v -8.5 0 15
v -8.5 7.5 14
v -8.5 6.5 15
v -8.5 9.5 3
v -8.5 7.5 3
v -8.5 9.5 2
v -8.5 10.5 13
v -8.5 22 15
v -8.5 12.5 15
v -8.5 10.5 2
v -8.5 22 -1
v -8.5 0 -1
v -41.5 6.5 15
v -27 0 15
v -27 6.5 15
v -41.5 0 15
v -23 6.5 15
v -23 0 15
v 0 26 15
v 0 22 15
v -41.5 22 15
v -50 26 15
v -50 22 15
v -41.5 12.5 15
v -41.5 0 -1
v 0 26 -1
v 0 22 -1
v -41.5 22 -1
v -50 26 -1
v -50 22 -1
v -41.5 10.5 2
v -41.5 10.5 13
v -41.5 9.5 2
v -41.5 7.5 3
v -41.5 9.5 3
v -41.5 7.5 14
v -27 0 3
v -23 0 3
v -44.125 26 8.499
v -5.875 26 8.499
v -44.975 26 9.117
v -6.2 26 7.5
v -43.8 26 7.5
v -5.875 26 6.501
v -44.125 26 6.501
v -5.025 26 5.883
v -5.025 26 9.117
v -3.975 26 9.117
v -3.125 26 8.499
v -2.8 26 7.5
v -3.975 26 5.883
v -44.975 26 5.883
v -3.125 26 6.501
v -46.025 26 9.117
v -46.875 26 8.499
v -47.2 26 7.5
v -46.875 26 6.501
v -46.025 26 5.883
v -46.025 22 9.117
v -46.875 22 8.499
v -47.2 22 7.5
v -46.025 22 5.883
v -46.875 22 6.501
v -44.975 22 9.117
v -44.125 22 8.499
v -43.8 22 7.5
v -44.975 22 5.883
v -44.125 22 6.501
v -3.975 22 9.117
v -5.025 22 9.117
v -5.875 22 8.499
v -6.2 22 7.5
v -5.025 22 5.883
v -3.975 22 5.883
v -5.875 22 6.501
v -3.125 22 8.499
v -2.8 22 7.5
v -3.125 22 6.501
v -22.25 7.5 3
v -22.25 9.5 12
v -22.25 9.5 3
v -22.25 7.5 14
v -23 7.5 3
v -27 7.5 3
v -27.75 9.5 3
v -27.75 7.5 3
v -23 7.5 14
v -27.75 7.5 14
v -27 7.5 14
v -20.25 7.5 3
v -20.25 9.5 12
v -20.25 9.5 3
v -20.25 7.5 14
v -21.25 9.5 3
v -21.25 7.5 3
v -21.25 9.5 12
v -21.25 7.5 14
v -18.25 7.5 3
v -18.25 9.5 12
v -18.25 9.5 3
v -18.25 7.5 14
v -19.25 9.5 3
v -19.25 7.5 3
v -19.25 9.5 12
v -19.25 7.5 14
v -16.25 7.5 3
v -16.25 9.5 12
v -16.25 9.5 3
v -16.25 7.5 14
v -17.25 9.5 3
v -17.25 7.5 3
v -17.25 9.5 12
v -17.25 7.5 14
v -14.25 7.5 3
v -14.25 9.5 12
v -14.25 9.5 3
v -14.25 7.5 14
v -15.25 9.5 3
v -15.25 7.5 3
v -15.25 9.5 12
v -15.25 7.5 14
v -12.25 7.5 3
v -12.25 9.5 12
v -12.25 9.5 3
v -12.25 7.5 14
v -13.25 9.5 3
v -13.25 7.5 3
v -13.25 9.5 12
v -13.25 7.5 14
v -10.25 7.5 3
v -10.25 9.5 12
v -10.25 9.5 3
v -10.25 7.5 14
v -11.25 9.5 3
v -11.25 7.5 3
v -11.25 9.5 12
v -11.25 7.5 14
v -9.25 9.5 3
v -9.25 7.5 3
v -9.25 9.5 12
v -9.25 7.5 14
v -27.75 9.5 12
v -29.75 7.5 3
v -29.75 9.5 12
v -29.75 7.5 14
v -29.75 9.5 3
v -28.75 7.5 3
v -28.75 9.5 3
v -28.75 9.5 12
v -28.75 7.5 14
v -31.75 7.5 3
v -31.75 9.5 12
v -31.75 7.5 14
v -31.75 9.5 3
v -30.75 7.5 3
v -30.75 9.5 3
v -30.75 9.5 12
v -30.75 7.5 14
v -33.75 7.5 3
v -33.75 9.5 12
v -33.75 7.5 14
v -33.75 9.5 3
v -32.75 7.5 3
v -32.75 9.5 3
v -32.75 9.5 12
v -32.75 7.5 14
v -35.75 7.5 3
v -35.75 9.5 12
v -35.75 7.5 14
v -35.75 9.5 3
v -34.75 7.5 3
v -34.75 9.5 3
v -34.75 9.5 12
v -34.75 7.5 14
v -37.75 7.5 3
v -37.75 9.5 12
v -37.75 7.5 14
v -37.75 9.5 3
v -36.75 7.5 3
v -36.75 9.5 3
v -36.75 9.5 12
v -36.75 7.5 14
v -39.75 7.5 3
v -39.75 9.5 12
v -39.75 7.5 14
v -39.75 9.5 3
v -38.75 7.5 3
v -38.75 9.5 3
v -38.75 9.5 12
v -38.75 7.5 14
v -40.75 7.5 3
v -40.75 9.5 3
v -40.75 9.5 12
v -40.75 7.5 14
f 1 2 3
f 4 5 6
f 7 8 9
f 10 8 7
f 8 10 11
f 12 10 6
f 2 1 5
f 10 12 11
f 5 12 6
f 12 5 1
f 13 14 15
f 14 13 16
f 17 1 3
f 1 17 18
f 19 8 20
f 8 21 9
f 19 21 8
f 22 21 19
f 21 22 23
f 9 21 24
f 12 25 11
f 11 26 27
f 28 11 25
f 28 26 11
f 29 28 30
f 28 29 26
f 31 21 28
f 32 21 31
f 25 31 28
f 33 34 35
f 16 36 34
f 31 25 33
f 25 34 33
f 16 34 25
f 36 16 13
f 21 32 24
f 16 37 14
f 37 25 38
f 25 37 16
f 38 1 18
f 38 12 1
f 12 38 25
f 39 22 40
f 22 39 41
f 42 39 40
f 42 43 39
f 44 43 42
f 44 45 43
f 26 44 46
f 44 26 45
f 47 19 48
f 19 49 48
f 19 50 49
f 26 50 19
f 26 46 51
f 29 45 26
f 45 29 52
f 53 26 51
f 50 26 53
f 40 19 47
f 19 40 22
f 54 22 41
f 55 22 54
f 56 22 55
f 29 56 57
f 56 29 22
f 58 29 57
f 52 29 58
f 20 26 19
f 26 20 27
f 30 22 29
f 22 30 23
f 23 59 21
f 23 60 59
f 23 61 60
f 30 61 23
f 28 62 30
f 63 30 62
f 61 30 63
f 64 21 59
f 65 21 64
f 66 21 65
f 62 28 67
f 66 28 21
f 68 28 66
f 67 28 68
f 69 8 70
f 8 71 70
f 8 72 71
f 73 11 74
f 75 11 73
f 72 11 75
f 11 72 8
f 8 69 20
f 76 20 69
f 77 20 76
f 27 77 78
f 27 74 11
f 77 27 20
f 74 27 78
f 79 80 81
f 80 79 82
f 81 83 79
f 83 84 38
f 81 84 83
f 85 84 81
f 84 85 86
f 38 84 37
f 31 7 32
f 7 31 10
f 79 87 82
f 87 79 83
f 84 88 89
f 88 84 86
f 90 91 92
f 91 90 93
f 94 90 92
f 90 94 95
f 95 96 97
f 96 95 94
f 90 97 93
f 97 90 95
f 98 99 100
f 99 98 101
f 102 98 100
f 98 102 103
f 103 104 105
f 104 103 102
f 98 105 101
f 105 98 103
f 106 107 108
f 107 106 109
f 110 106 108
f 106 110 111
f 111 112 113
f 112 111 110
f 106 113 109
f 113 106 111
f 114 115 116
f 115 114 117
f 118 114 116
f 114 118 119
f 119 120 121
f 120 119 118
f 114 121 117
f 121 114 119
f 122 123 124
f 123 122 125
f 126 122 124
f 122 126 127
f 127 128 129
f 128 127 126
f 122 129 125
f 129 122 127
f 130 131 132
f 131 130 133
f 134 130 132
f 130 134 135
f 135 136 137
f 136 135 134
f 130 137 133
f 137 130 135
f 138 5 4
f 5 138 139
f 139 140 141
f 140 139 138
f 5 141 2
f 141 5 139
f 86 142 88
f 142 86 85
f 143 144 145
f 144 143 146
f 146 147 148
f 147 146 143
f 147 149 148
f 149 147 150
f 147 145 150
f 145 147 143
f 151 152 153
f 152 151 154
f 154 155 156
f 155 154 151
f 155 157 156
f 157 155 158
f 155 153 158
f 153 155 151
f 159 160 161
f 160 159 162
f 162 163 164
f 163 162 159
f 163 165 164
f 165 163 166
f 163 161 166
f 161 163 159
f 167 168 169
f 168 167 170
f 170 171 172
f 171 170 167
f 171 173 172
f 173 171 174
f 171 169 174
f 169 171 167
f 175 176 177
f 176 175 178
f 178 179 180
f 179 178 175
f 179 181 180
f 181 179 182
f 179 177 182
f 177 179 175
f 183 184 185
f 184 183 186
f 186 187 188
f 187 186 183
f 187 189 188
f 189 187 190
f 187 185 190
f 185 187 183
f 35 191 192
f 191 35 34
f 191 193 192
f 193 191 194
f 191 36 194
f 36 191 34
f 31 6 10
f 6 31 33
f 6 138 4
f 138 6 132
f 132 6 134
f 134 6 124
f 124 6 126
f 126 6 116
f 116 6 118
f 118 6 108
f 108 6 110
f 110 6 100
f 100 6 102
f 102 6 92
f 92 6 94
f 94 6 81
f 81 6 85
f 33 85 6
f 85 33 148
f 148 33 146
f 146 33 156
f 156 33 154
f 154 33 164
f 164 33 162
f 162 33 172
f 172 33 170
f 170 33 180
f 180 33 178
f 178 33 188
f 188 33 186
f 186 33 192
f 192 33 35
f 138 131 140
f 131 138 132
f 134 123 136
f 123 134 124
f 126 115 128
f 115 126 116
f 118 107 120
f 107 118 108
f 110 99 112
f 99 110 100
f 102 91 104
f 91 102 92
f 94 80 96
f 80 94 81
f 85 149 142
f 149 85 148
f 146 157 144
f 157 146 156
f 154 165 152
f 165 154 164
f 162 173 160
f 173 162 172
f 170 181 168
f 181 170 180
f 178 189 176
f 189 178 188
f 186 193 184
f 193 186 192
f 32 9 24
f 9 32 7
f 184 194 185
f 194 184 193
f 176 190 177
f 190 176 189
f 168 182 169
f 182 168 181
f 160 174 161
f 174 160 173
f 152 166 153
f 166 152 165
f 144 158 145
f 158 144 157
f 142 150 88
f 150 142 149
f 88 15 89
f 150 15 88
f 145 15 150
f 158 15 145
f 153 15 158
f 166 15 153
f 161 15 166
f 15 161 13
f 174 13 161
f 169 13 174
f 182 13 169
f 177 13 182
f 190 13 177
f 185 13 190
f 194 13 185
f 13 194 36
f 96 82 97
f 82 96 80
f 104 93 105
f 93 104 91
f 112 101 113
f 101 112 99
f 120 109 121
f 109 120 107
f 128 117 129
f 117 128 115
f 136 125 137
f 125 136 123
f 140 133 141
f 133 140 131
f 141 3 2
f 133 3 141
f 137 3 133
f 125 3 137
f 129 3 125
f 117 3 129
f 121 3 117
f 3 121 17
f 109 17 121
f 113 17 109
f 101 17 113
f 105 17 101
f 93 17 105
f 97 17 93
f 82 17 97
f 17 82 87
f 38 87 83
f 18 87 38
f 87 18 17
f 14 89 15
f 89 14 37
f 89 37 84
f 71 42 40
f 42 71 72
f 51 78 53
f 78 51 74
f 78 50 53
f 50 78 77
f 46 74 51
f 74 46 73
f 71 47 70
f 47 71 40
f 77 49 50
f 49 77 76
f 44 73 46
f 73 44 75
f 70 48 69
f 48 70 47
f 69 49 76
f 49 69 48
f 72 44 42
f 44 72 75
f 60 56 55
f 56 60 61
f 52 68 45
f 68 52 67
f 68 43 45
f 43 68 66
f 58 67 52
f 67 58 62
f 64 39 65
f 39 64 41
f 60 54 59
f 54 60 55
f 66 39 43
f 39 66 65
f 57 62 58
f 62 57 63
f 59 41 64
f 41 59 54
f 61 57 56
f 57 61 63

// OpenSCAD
// file: ../../configuration.scad
belt_type = "GT2"; // T2.5, T5, HTD3, MXL, GT2

belt_tooth_distance = 
	(belt_type=="T2.5") ? 2.5 :
	(belt_type=="T5") ? 5 : 
	(belt_type=="HTD3") ? 3 : 
	(belt_type=="MXL") ? 2.032 : 
	(belt_type=="GT2") ? 2 : 
	0;

belt_tooth_ratio = 
	(belt_type=="T2.5") ? 0.5 :
	(belt_type=="T5") ? 0.75 : 
	(belt_type=="HTD3") ? 0.75 : 
	(belt_type=="MXL") ? 0.64 : 
	(belt_type=="GT2") ? 0.5 : 
	0;

belt_tooth_width = 
	(belt_type=="HTD3") ? 1.3 :
	1;
// main file
// PRUSA iteration3
// Y belt holder
// GNU GPL v3
// Josef Průša <iam@josefprusa.cz> and contributors
// http://www.reprap.org/wiki/Prusa_Mendel
// http://prusamendel.org

include <../../configuration.scad>

module belt_holder_base(){
 translate([-33-8.5,0,-1]) cube([33,15,16]); 
 translate([-33-8.5,11,-1]) cube([33,15,16]);
 translate([-50,22,-1]) cube([50,4,16]);	
}

module belt_holder_beltcut(){
 // Belt slit
 translate([-66,-0.5+10,belt_tooth_distance]) cube([67,1,15]);
 // Smooth insert cutout
 translate([-66,-0.5+10,12]) rotate([45,0,0]) cube([67,15,15]);
 
 holder_tooth_width = belt_tooth_distance - belt_tooth_width;
 teeth_count = ((33-4)/2 - holder_tooth_width)/belt_tooth_distance;
 teeth_count_module = teeth_count % 1;
 position_tweak = belt_tooth_distance*(teeth_count_module)/2;
 loop_count = teeth_count-teeth_count_module+1;
 // Individual teeth
 translate([-25, -0.5+8, 3])
 {
 holder_teeth(belt_tooth_distance, belt_tooth_width, position_tweak, loop_count);
 mirror([1, 0, 0]) holder_teeth(belt_tooth_distance, belt_tooth_width, position_tweak, loop_count);
 }
 // Middle opening
 translate([-2-25,-1,3]) cube([4,11,15]);	
}

module holder_teeth(belt_tooth_distance, belt_tooth_width, position_tweak, loop_count) {
 cube([2-belt_tooth_width+position_tweak+belt_tooth_width, 3, 15]);
 for ( i = [0 : loop_count-1] ){
  translate([2-belt_tooth_width+position_tweak+i*belt_tooth_distance, 0, 0]) cube([belt_tooth_width, 3, 15]);
 }
 translate([2-belt_tooth_width+position_tweak+loop_count*belt_tooth_distance, 0, 0]) cube([belt_tooth_distance, 3, 15]);
}

module belt_holder_holes(){
 translate([-4.5,0,7.5]) rotate([-90,0,0]) cylinder(h=30, r=1.7, $fn=10);
 translate([-45.5,0,7.5]) rotate([-90,0,0]) cylinder(h=30, r=1.7, $fn=10);
}

// Final part
module belt_holder(){
 difference(){
  belt_holder_base();
  belt_holder_beltcut();
  belt_holder_holes();
 }
}

belt_holder();
